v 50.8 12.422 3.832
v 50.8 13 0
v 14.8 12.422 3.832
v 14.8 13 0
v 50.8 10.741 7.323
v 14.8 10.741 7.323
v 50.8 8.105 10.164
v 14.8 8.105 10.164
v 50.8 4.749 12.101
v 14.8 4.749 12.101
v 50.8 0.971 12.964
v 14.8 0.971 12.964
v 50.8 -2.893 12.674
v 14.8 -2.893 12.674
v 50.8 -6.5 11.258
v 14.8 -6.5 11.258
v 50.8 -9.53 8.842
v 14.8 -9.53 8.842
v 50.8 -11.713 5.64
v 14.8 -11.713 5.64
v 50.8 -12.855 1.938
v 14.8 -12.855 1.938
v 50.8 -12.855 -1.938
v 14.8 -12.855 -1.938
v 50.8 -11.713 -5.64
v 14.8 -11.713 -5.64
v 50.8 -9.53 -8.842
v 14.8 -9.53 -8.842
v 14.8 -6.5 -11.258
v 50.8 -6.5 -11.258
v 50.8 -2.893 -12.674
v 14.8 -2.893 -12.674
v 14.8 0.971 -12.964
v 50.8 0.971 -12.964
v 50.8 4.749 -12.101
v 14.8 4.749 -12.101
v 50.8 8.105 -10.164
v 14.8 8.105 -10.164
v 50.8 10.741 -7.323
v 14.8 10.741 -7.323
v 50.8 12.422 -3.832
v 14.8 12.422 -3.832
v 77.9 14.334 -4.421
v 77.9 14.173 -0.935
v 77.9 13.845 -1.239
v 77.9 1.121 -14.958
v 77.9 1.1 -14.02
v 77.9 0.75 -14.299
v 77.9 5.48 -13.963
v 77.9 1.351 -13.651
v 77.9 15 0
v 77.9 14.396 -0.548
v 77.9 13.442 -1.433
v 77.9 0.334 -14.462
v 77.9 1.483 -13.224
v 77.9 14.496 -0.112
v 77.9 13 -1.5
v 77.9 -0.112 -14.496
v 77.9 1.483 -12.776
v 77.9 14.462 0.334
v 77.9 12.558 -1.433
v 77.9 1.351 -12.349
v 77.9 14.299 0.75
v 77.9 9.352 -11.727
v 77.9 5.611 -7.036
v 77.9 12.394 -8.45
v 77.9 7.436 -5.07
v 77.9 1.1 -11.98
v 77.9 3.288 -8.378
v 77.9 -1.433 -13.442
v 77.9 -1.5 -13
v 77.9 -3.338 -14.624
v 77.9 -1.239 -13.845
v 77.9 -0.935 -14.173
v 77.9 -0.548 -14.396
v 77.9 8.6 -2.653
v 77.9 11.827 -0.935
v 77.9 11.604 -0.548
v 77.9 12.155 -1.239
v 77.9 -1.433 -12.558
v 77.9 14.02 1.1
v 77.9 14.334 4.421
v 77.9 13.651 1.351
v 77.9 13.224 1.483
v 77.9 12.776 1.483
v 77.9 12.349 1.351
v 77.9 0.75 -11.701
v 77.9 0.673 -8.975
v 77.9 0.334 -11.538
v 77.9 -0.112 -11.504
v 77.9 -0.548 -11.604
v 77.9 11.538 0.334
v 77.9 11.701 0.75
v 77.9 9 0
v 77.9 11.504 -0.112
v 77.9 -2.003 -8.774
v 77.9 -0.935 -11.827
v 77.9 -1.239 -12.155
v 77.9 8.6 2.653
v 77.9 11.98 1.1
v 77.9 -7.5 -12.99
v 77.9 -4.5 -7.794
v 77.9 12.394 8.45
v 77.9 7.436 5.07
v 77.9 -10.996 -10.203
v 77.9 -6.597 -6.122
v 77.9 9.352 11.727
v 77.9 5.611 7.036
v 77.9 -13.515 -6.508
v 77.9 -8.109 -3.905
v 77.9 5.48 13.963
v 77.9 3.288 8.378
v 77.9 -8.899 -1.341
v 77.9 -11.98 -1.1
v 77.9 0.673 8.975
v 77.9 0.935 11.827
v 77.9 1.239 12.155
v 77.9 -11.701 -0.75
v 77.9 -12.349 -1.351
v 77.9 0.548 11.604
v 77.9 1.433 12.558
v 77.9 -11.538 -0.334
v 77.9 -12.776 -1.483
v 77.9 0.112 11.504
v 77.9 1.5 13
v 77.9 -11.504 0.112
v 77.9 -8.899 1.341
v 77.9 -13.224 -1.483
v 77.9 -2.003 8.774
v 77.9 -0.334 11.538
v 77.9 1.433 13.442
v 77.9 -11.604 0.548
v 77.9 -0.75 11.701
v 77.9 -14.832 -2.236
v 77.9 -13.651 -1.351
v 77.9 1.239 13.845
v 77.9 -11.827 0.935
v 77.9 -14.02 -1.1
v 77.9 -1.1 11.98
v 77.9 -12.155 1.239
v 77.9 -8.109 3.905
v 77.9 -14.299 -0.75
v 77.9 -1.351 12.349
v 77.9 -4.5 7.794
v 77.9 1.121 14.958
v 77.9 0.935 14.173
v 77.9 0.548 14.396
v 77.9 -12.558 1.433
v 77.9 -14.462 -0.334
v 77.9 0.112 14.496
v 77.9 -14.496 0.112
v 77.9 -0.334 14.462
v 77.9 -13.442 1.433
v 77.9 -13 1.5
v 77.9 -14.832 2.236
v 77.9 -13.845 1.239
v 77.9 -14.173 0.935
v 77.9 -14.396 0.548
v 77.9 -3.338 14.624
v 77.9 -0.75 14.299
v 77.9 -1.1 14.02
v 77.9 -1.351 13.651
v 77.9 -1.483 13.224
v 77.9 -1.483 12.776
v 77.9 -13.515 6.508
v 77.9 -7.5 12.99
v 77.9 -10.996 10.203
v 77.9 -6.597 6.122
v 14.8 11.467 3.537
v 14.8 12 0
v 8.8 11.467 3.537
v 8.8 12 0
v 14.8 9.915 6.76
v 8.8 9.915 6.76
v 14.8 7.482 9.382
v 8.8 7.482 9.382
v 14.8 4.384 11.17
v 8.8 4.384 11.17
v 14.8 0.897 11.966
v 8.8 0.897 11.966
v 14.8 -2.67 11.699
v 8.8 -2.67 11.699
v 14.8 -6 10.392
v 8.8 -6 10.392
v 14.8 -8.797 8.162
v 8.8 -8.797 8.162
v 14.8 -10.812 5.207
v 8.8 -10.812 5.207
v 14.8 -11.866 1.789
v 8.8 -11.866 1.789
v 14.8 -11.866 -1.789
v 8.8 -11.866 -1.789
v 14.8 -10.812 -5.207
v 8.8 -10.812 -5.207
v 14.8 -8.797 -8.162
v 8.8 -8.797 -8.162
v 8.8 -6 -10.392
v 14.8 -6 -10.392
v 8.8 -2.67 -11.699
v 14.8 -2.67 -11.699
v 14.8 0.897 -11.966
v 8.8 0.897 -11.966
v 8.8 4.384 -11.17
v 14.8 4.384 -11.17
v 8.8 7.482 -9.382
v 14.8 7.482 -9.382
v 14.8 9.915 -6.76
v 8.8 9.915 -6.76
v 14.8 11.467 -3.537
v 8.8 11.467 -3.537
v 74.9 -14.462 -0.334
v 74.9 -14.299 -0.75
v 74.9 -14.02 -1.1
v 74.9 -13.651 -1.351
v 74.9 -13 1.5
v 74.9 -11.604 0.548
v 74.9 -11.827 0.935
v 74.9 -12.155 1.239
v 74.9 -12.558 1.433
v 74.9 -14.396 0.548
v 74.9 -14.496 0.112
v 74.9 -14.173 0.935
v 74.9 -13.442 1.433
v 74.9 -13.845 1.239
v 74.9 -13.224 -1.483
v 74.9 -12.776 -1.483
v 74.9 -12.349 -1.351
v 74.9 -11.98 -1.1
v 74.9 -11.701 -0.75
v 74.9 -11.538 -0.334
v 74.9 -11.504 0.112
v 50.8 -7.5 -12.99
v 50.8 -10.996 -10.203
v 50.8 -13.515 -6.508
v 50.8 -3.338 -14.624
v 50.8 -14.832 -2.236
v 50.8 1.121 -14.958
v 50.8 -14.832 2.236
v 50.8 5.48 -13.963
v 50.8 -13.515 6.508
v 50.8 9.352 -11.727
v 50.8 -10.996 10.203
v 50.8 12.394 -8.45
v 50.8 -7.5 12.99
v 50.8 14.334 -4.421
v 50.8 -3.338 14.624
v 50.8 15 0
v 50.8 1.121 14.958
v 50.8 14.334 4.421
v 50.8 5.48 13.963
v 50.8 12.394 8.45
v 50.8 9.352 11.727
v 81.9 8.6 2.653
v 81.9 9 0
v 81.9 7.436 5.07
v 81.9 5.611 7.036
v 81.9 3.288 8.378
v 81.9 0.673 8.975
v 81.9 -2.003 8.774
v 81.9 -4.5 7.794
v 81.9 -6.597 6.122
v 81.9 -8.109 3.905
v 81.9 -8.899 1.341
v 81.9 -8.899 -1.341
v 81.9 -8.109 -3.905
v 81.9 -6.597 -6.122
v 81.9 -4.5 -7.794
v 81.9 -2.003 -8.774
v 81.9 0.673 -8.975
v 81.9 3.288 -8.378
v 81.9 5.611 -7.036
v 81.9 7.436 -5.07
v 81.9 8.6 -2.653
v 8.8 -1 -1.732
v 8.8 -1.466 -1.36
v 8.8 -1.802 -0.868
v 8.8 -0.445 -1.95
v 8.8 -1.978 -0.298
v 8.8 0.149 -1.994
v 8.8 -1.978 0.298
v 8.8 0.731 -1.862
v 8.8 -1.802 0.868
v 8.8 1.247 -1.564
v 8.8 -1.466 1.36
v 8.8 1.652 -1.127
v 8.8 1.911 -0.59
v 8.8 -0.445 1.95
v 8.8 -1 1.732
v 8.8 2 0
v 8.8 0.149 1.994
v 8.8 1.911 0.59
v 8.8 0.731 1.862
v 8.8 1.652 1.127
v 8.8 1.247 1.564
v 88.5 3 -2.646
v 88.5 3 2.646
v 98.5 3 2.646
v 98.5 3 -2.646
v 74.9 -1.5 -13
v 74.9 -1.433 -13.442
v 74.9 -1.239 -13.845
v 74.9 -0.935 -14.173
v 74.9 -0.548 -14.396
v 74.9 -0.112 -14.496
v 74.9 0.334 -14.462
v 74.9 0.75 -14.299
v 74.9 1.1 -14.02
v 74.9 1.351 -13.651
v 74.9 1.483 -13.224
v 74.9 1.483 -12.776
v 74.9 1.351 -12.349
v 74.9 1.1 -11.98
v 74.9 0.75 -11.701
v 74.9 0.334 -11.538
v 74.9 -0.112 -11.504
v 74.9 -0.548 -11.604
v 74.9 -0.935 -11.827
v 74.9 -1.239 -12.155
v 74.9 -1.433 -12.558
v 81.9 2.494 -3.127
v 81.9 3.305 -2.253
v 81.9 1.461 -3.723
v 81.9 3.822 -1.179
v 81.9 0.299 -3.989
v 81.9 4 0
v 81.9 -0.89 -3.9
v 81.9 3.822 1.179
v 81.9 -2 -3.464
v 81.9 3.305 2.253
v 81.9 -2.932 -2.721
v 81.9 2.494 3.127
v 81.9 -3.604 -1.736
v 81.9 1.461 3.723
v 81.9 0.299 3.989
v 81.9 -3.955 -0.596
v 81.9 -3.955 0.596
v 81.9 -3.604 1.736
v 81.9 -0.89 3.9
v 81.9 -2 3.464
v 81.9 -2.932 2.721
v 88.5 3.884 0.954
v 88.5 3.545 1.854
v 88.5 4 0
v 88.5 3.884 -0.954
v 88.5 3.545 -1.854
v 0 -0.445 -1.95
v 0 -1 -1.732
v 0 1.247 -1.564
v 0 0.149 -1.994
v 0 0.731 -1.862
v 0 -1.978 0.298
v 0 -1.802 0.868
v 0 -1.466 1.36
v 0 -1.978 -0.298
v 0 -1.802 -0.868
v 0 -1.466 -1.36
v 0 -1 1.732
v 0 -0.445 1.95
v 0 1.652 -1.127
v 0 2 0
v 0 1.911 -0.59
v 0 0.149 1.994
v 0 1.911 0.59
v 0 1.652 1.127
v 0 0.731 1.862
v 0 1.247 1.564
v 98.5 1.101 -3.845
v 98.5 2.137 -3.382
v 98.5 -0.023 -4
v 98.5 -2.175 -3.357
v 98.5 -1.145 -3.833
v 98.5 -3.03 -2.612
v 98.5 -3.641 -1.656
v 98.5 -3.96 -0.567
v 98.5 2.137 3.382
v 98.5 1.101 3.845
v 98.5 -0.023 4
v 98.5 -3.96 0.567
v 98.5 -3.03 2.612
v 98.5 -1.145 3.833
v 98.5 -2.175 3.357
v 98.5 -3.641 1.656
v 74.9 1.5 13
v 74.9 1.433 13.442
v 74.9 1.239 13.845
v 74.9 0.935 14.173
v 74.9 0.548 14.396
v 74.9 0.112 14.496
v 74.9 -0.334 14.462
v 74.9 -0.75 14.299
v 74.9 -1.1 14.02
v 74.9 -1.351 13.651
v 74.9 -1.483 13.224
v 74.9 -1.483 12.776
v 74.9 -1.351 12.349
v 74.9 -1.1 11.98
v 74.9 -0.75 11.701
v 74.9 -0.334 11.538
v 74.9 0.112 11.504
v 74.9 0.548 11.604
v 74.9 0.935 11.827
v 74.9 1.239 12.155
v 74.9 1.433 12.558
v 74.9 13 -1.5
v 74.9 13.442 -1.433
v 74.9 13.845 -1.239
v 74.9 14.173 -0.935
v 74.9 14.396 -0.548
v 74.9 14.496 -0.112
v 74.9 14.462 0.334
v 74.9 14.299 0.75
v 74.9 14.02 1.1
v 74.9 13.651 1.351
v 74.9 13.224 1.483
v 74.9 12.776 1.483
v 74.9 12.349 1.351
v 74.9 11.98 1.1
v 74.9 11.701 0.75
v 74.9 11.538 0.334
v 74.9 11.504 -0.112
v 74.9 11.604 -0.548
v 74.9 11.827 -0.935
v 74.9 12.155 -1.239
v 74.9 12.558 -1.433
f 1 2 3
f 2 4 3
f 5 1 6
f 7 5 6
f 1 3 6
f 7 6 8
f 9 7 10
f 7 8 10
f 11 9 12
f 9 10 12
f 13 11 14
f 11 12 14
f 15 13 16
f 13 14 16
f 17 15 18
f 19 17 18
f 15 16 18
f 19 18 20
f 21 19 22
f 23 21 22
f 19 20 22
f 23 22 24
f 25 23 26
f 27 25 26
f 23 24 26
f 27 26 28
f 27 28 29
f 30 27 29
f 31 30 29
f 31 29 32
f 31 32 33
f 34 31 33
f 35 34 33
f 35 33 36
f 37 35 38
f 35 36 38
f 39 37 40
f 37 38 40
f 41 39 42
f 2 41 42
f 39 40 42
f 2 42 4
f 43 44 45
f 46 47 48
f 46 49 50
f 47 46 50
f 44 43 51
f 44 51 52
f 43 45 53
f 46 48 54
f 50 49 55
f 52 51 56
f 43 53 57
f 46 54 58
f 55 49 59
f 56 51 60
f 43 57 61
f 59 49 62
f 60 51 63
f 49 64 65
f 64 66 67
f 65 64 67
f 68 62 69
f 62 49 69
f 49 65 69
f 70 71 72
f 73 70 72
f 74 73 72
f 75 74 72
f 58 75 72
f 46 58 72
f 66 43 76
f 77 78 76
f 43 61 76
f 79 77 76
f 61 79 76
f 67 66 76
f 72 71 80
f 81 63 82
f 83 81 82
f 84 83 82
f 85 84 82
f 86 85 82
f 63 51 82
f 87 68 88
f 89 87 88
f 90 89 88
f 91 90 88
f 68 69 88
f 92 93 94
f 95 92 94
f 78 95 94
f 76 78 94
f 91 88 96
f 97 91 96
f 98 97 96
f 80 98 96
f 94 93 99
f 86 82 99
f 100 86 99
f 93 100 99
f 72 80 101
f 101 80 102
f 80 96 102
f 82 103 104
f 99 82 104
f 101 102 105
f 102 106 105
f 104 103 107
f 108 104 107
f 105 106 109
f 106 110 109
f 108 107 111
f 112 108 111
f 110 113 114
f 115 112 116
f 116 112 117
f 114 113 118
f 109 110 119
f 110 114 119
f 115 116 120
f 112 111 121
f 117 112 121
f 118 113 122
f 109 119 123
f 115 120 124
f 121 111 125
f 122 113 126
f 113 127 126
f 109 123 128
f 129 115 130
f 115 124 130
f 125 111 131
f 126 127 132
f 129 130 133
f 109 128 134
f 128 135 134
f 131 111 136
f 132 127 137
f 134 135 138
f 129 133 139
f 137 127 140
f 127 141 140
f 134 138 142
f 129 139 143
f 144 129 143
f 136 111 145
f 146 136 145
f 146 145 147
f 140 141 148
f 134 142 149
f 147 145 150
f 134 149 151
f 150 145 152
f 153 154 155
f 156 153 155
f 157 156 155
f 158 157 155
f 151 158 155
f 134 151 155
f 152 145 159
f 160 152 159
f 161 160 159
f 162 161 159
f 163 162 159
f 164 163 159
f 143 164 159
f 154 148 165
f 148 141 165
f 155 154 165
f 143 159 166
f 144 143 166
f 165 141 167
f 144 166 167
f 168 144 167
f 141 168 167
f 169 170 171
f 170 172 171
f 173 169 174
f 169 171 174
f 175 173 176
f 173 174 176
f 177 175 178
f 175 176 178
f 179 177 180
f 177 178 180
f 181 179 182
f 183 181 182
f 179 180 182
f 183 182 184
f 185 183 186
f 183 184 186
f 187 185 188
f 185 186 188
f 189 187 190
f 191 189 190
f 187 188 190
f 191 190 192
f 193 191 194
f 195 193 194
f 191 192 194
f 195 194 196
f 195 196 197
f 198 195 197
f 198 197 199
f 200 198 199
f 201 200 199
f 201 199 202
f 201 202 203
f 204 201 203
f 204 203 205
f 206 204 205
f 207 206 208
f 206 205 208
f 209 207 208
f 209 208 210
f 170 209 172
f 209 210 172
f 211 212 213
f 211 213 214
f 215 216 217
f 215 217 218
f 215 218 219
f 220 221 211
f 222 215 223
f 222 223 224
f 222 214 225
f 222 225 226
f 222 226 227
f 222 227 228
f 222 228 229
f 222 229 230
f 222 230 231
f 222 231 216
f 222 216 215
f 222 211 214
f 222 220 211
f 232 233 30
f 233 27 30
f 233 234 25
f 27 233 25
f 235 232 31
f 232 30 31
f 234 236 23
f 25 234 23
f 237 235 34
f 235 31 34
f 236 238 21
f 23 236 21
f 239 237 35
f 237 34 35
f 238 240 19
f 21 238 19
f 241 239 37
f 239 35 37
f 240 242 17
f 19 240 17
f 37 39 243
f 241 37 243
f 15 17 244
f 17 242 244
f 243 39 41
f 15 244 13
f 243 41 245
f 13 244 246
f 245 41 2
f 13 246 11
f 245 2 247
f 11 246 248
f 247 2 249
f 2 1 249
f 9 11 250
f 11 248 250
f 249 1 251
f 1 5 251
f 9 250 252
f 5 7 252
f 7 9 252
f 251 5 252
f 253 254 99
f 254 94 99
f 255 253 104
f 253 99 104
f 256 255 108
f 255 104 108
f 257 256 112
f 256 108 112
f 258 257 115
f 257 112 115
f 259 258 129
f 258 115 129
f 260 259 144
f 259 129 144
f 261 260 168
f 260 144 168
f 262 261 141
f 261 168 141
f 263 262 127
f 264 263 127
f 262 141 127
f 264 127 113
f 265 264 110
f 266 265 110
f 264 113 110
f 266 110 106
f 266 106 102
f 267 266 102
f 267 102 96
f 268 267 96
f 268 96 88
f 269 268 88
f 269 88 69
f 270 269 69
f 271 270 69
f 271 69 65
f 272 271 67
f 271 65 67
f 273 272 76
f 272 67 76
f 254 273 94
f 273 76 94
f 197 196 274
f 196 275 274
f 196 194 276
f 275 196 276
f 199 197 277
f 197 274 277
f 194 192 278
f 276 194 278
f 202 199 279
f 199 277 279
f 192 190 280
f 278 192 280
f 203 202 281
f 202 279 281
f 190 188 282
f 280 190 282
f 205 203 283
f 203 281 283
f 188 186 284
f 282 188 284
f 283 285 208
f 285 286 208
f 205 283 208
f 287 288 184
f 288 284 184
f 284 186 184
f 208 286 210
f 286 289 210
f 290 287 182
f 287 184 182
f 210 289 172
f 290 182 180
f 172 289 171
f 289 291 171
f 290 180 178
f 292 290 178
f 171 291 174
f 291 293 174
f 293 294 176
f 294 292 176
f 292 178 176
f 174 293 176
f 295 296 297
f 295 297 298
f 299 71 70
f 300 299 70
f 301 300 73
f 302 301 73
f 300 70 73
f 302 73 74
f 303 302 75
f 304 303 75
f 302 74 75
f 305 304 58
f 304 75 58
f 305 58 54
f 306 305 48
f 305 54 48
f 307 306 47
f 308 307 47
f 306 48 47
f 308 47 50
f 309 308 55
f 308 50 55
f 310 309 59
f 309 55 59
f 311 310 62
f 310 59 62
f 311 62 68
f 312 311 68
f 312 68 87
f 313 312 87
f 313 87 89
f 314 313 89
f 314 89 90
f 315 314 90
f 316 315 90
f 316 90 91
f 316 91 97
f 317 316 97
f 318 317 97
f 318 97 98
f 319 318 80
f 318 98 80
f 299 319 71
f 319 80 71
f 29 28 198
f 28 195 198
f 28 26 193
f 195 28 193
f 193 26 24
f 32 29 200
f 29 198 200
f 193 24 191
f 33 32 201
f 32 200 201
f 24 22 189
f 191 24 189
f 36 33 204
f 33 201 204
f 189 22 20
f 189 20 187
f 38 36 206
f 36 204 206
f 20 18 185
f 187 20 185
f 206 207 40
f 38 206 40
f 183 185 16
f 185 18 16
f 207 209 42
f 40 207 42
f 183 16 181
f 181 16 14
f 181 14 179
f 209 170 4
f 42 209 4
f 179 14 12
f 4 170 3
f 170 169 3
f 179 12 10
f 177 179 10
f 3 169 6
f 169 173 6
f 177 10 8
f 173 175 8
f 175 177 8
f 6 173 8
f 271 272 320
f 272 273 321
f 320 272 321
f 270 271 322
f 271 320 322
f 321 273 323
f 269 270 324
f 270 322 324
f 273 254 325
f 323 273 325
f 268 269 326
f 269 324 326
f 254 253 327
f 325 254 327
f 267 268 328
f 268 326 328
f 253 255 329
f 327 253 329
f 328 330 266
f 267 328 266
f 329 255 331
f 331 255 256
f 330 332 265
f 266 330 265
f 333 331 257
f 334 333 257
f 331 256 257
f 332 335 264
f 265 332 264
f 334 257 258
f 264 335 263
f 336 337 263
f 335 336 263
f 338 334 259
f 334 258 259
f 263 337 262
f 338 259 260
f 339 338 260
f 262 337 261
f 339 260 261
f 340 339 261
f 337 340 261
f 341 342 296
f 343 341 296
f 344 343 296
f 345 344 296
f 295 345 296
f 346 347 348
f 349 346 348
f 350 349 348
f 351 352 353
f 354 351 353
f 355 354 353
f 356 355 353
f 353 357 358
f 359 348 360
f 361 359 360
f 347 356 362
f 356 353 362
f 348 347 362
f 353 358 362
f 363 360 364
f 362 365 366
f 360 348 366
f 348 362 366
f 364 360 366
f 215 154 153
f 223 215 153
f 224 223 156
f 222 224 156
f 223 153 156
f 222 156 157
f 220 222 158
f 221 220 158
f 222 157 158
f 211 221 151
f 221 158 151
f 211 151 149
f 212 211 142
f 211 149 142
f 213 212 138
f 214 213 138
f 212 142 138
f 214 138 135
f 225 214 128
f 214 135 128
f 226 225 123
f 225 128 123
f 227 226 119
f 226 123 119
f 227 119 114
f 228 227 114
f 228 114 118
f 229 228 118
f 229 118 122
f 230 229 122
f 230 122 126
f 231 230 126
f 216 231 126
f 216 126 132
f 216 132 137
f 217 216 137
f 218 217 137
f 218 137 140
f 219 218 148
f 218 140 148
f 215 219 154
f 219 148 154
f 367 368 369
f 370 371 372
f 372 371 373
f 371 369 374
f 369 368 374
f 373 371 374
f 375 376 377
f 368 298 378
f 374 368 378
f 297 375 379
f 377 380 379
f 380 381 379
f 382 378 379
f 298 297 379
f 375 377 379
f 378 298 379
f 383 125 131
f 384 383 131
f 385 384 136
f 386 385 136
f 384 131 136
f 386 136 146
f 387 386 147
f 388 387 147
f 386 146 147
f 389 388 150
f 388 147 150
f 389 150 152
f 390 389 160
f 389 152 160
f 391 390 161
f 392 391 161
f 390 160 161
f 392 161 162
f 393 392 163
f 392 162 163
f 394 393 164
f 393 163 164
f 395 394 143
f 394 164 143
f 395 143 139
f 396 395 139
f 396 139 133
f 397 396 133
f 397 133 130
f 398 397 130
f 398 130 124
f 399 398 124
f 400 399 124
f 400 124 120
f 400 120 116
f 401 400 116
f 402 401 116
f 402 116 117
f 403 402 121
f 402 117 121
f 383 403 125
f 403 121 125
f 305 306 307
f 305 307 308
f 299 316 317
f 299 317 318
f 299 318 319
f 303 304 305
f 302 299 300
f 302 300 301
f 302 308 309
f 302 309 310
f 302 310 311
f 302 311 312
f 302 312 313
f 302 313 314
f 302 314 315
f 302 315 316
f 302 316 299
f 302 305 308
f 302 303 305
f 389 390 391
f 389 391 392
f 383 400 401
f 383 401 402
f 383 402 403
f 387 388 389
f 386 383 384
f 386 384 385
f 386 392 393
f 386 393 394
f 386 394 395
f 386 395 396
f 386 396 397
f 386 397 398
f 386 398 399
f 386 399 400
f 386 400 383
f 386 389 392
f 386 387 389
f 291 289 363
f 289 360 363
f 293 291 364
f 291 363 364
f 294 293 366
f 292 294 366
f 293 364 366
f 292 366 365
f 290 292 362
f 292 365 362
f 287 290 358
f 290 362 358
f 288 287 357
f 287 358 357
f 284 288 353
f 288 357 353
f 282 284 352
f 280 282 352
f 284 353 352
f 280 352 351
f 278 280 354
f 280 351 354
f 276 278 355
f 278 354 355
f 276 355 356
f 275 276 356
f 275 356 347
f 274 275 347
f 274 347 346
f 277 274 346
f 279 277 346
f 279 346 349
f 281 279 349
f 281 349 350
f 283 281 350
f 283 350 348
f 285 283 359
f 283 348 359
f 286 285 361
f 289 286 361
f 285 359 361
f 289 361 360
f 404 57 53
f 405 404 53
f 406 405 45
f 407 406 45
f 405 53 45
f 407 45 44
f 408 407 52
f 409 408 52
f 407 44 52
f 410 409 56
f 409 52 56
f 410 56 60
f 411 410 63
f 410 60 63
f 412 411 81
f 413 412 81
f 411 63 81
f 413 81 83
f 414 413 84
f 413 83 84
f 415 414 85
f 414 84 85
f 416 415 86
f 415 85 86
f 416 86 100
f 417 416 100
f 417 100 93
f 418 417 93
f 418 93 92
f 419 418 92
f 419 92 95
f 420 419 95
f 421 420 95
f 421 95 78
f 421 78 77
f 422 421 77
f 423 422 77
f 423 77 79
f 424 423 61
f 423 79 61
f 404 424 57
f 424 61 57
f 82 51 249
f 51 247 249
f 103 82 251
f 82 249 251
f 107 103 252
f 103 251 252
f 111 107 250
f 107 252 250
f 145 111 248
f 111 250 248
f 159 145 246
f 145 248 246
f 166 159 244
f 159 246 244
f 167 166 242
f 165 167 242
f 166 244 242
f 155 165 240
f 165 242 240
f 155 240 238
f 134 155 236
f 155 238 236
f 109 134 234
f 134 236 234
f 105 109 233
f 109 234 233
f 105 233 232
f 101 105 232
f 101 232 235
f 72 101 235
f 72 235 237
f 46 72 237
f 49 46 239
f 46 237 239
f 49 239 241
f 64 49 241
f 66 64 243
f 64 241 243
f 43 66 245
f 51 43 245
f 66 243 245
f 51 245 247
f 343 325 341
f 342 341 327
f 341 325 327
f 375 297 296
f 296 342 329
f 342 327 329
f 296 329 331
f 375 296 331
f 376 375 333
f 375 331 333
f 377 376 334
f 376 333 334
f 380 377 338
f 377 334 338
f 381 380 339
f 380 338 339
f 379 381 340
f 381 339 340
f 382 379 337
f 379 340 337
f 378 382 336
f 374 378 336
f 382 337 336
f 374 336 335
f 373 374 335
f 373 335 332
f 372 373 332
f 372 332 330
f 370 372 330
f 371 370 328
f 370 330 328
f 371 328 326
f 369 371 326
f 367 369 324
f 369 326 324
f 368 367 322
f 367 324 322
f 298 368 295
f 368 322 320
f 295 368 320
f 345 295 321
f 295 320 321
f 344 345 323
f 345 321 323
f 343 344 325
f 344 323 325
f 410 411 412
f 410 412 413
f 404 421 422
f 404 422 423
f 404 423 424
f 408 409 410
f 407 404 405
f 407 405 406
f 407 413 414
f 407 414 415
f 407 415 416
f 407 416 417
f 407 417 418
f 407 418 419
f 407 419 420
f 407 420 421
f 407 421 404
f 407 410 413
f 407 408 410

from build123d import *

# Parameters (mm, degrees)
ESQUISSE2_W             = 5.291502622
ESQUISSE2_H             = 1
ENL_V_MAT_EXTRU_1_DEPTH = 10
ESQUISSE3_R             = 1.5
FIXHOLES_DEPTH          = 3
REPEATFIXHOLES_COUNT    = 4


with BuildPart() as part:
    # Esquisse1 → MainRevolution (revolve)
    with BuildSketch(Plane.XY):
        Polygon((0, 0), (98.5, 0), (98.5, 4), (81.9, 4), (81.9, 9), (77.9, 9), (77.9, 15), (50.8, 15), (50.8, 13), (14.8, 13), (14.8, 12), (8.8, 12), (8.8, 2), (0, 2), align=None)
    revolve(axis=Axis((0, 0, 0), (1, 0, 0)))

    # Esquisse2 → Enlèv. mat.-Extru.1 (cut)
    with BuildSketch(Plane(origin=(98.5, 0, 0), x_dir=(0, 0, -1), z_dir=(1, 0, 0))):
        with Locations((0, 3.5)):
            Rectangle(ESQUISSE2_W, ESQUISSE2_H)
    extrude(amount=-ENL_V_MAT_EXTRU_1_DEPTH, mode=Mode.SUBTRACT)

    # Esquisse3 → FixHoles (cut)
    with BuildSketch(Plane(origin=(77.9, 0, 0), x_dir=(0, 0, -1), z_dir=(1, 0, 0))):
        with Locations((0, 13)):
            Circle(ESQUISSE3_R)
    fixholes = extrude(amount=-FIXHOLES_DEPTH, mode=Mode.SUBTRACT)

    # RepeatFixHoles: FixHoles ×4 about axis
    repeatfixholes_axis = Axis((-5.325, 0, 0), (1, 0, 0))
    for i in range(1, REPEATFIXHOLES_COUNT):
        add(fixholes.rotate(repeatfixholes_axis, i * 360 / REPEATFIXHOLES_COUNT), mode=Mode.SUBTRACT)


solid = part.part
